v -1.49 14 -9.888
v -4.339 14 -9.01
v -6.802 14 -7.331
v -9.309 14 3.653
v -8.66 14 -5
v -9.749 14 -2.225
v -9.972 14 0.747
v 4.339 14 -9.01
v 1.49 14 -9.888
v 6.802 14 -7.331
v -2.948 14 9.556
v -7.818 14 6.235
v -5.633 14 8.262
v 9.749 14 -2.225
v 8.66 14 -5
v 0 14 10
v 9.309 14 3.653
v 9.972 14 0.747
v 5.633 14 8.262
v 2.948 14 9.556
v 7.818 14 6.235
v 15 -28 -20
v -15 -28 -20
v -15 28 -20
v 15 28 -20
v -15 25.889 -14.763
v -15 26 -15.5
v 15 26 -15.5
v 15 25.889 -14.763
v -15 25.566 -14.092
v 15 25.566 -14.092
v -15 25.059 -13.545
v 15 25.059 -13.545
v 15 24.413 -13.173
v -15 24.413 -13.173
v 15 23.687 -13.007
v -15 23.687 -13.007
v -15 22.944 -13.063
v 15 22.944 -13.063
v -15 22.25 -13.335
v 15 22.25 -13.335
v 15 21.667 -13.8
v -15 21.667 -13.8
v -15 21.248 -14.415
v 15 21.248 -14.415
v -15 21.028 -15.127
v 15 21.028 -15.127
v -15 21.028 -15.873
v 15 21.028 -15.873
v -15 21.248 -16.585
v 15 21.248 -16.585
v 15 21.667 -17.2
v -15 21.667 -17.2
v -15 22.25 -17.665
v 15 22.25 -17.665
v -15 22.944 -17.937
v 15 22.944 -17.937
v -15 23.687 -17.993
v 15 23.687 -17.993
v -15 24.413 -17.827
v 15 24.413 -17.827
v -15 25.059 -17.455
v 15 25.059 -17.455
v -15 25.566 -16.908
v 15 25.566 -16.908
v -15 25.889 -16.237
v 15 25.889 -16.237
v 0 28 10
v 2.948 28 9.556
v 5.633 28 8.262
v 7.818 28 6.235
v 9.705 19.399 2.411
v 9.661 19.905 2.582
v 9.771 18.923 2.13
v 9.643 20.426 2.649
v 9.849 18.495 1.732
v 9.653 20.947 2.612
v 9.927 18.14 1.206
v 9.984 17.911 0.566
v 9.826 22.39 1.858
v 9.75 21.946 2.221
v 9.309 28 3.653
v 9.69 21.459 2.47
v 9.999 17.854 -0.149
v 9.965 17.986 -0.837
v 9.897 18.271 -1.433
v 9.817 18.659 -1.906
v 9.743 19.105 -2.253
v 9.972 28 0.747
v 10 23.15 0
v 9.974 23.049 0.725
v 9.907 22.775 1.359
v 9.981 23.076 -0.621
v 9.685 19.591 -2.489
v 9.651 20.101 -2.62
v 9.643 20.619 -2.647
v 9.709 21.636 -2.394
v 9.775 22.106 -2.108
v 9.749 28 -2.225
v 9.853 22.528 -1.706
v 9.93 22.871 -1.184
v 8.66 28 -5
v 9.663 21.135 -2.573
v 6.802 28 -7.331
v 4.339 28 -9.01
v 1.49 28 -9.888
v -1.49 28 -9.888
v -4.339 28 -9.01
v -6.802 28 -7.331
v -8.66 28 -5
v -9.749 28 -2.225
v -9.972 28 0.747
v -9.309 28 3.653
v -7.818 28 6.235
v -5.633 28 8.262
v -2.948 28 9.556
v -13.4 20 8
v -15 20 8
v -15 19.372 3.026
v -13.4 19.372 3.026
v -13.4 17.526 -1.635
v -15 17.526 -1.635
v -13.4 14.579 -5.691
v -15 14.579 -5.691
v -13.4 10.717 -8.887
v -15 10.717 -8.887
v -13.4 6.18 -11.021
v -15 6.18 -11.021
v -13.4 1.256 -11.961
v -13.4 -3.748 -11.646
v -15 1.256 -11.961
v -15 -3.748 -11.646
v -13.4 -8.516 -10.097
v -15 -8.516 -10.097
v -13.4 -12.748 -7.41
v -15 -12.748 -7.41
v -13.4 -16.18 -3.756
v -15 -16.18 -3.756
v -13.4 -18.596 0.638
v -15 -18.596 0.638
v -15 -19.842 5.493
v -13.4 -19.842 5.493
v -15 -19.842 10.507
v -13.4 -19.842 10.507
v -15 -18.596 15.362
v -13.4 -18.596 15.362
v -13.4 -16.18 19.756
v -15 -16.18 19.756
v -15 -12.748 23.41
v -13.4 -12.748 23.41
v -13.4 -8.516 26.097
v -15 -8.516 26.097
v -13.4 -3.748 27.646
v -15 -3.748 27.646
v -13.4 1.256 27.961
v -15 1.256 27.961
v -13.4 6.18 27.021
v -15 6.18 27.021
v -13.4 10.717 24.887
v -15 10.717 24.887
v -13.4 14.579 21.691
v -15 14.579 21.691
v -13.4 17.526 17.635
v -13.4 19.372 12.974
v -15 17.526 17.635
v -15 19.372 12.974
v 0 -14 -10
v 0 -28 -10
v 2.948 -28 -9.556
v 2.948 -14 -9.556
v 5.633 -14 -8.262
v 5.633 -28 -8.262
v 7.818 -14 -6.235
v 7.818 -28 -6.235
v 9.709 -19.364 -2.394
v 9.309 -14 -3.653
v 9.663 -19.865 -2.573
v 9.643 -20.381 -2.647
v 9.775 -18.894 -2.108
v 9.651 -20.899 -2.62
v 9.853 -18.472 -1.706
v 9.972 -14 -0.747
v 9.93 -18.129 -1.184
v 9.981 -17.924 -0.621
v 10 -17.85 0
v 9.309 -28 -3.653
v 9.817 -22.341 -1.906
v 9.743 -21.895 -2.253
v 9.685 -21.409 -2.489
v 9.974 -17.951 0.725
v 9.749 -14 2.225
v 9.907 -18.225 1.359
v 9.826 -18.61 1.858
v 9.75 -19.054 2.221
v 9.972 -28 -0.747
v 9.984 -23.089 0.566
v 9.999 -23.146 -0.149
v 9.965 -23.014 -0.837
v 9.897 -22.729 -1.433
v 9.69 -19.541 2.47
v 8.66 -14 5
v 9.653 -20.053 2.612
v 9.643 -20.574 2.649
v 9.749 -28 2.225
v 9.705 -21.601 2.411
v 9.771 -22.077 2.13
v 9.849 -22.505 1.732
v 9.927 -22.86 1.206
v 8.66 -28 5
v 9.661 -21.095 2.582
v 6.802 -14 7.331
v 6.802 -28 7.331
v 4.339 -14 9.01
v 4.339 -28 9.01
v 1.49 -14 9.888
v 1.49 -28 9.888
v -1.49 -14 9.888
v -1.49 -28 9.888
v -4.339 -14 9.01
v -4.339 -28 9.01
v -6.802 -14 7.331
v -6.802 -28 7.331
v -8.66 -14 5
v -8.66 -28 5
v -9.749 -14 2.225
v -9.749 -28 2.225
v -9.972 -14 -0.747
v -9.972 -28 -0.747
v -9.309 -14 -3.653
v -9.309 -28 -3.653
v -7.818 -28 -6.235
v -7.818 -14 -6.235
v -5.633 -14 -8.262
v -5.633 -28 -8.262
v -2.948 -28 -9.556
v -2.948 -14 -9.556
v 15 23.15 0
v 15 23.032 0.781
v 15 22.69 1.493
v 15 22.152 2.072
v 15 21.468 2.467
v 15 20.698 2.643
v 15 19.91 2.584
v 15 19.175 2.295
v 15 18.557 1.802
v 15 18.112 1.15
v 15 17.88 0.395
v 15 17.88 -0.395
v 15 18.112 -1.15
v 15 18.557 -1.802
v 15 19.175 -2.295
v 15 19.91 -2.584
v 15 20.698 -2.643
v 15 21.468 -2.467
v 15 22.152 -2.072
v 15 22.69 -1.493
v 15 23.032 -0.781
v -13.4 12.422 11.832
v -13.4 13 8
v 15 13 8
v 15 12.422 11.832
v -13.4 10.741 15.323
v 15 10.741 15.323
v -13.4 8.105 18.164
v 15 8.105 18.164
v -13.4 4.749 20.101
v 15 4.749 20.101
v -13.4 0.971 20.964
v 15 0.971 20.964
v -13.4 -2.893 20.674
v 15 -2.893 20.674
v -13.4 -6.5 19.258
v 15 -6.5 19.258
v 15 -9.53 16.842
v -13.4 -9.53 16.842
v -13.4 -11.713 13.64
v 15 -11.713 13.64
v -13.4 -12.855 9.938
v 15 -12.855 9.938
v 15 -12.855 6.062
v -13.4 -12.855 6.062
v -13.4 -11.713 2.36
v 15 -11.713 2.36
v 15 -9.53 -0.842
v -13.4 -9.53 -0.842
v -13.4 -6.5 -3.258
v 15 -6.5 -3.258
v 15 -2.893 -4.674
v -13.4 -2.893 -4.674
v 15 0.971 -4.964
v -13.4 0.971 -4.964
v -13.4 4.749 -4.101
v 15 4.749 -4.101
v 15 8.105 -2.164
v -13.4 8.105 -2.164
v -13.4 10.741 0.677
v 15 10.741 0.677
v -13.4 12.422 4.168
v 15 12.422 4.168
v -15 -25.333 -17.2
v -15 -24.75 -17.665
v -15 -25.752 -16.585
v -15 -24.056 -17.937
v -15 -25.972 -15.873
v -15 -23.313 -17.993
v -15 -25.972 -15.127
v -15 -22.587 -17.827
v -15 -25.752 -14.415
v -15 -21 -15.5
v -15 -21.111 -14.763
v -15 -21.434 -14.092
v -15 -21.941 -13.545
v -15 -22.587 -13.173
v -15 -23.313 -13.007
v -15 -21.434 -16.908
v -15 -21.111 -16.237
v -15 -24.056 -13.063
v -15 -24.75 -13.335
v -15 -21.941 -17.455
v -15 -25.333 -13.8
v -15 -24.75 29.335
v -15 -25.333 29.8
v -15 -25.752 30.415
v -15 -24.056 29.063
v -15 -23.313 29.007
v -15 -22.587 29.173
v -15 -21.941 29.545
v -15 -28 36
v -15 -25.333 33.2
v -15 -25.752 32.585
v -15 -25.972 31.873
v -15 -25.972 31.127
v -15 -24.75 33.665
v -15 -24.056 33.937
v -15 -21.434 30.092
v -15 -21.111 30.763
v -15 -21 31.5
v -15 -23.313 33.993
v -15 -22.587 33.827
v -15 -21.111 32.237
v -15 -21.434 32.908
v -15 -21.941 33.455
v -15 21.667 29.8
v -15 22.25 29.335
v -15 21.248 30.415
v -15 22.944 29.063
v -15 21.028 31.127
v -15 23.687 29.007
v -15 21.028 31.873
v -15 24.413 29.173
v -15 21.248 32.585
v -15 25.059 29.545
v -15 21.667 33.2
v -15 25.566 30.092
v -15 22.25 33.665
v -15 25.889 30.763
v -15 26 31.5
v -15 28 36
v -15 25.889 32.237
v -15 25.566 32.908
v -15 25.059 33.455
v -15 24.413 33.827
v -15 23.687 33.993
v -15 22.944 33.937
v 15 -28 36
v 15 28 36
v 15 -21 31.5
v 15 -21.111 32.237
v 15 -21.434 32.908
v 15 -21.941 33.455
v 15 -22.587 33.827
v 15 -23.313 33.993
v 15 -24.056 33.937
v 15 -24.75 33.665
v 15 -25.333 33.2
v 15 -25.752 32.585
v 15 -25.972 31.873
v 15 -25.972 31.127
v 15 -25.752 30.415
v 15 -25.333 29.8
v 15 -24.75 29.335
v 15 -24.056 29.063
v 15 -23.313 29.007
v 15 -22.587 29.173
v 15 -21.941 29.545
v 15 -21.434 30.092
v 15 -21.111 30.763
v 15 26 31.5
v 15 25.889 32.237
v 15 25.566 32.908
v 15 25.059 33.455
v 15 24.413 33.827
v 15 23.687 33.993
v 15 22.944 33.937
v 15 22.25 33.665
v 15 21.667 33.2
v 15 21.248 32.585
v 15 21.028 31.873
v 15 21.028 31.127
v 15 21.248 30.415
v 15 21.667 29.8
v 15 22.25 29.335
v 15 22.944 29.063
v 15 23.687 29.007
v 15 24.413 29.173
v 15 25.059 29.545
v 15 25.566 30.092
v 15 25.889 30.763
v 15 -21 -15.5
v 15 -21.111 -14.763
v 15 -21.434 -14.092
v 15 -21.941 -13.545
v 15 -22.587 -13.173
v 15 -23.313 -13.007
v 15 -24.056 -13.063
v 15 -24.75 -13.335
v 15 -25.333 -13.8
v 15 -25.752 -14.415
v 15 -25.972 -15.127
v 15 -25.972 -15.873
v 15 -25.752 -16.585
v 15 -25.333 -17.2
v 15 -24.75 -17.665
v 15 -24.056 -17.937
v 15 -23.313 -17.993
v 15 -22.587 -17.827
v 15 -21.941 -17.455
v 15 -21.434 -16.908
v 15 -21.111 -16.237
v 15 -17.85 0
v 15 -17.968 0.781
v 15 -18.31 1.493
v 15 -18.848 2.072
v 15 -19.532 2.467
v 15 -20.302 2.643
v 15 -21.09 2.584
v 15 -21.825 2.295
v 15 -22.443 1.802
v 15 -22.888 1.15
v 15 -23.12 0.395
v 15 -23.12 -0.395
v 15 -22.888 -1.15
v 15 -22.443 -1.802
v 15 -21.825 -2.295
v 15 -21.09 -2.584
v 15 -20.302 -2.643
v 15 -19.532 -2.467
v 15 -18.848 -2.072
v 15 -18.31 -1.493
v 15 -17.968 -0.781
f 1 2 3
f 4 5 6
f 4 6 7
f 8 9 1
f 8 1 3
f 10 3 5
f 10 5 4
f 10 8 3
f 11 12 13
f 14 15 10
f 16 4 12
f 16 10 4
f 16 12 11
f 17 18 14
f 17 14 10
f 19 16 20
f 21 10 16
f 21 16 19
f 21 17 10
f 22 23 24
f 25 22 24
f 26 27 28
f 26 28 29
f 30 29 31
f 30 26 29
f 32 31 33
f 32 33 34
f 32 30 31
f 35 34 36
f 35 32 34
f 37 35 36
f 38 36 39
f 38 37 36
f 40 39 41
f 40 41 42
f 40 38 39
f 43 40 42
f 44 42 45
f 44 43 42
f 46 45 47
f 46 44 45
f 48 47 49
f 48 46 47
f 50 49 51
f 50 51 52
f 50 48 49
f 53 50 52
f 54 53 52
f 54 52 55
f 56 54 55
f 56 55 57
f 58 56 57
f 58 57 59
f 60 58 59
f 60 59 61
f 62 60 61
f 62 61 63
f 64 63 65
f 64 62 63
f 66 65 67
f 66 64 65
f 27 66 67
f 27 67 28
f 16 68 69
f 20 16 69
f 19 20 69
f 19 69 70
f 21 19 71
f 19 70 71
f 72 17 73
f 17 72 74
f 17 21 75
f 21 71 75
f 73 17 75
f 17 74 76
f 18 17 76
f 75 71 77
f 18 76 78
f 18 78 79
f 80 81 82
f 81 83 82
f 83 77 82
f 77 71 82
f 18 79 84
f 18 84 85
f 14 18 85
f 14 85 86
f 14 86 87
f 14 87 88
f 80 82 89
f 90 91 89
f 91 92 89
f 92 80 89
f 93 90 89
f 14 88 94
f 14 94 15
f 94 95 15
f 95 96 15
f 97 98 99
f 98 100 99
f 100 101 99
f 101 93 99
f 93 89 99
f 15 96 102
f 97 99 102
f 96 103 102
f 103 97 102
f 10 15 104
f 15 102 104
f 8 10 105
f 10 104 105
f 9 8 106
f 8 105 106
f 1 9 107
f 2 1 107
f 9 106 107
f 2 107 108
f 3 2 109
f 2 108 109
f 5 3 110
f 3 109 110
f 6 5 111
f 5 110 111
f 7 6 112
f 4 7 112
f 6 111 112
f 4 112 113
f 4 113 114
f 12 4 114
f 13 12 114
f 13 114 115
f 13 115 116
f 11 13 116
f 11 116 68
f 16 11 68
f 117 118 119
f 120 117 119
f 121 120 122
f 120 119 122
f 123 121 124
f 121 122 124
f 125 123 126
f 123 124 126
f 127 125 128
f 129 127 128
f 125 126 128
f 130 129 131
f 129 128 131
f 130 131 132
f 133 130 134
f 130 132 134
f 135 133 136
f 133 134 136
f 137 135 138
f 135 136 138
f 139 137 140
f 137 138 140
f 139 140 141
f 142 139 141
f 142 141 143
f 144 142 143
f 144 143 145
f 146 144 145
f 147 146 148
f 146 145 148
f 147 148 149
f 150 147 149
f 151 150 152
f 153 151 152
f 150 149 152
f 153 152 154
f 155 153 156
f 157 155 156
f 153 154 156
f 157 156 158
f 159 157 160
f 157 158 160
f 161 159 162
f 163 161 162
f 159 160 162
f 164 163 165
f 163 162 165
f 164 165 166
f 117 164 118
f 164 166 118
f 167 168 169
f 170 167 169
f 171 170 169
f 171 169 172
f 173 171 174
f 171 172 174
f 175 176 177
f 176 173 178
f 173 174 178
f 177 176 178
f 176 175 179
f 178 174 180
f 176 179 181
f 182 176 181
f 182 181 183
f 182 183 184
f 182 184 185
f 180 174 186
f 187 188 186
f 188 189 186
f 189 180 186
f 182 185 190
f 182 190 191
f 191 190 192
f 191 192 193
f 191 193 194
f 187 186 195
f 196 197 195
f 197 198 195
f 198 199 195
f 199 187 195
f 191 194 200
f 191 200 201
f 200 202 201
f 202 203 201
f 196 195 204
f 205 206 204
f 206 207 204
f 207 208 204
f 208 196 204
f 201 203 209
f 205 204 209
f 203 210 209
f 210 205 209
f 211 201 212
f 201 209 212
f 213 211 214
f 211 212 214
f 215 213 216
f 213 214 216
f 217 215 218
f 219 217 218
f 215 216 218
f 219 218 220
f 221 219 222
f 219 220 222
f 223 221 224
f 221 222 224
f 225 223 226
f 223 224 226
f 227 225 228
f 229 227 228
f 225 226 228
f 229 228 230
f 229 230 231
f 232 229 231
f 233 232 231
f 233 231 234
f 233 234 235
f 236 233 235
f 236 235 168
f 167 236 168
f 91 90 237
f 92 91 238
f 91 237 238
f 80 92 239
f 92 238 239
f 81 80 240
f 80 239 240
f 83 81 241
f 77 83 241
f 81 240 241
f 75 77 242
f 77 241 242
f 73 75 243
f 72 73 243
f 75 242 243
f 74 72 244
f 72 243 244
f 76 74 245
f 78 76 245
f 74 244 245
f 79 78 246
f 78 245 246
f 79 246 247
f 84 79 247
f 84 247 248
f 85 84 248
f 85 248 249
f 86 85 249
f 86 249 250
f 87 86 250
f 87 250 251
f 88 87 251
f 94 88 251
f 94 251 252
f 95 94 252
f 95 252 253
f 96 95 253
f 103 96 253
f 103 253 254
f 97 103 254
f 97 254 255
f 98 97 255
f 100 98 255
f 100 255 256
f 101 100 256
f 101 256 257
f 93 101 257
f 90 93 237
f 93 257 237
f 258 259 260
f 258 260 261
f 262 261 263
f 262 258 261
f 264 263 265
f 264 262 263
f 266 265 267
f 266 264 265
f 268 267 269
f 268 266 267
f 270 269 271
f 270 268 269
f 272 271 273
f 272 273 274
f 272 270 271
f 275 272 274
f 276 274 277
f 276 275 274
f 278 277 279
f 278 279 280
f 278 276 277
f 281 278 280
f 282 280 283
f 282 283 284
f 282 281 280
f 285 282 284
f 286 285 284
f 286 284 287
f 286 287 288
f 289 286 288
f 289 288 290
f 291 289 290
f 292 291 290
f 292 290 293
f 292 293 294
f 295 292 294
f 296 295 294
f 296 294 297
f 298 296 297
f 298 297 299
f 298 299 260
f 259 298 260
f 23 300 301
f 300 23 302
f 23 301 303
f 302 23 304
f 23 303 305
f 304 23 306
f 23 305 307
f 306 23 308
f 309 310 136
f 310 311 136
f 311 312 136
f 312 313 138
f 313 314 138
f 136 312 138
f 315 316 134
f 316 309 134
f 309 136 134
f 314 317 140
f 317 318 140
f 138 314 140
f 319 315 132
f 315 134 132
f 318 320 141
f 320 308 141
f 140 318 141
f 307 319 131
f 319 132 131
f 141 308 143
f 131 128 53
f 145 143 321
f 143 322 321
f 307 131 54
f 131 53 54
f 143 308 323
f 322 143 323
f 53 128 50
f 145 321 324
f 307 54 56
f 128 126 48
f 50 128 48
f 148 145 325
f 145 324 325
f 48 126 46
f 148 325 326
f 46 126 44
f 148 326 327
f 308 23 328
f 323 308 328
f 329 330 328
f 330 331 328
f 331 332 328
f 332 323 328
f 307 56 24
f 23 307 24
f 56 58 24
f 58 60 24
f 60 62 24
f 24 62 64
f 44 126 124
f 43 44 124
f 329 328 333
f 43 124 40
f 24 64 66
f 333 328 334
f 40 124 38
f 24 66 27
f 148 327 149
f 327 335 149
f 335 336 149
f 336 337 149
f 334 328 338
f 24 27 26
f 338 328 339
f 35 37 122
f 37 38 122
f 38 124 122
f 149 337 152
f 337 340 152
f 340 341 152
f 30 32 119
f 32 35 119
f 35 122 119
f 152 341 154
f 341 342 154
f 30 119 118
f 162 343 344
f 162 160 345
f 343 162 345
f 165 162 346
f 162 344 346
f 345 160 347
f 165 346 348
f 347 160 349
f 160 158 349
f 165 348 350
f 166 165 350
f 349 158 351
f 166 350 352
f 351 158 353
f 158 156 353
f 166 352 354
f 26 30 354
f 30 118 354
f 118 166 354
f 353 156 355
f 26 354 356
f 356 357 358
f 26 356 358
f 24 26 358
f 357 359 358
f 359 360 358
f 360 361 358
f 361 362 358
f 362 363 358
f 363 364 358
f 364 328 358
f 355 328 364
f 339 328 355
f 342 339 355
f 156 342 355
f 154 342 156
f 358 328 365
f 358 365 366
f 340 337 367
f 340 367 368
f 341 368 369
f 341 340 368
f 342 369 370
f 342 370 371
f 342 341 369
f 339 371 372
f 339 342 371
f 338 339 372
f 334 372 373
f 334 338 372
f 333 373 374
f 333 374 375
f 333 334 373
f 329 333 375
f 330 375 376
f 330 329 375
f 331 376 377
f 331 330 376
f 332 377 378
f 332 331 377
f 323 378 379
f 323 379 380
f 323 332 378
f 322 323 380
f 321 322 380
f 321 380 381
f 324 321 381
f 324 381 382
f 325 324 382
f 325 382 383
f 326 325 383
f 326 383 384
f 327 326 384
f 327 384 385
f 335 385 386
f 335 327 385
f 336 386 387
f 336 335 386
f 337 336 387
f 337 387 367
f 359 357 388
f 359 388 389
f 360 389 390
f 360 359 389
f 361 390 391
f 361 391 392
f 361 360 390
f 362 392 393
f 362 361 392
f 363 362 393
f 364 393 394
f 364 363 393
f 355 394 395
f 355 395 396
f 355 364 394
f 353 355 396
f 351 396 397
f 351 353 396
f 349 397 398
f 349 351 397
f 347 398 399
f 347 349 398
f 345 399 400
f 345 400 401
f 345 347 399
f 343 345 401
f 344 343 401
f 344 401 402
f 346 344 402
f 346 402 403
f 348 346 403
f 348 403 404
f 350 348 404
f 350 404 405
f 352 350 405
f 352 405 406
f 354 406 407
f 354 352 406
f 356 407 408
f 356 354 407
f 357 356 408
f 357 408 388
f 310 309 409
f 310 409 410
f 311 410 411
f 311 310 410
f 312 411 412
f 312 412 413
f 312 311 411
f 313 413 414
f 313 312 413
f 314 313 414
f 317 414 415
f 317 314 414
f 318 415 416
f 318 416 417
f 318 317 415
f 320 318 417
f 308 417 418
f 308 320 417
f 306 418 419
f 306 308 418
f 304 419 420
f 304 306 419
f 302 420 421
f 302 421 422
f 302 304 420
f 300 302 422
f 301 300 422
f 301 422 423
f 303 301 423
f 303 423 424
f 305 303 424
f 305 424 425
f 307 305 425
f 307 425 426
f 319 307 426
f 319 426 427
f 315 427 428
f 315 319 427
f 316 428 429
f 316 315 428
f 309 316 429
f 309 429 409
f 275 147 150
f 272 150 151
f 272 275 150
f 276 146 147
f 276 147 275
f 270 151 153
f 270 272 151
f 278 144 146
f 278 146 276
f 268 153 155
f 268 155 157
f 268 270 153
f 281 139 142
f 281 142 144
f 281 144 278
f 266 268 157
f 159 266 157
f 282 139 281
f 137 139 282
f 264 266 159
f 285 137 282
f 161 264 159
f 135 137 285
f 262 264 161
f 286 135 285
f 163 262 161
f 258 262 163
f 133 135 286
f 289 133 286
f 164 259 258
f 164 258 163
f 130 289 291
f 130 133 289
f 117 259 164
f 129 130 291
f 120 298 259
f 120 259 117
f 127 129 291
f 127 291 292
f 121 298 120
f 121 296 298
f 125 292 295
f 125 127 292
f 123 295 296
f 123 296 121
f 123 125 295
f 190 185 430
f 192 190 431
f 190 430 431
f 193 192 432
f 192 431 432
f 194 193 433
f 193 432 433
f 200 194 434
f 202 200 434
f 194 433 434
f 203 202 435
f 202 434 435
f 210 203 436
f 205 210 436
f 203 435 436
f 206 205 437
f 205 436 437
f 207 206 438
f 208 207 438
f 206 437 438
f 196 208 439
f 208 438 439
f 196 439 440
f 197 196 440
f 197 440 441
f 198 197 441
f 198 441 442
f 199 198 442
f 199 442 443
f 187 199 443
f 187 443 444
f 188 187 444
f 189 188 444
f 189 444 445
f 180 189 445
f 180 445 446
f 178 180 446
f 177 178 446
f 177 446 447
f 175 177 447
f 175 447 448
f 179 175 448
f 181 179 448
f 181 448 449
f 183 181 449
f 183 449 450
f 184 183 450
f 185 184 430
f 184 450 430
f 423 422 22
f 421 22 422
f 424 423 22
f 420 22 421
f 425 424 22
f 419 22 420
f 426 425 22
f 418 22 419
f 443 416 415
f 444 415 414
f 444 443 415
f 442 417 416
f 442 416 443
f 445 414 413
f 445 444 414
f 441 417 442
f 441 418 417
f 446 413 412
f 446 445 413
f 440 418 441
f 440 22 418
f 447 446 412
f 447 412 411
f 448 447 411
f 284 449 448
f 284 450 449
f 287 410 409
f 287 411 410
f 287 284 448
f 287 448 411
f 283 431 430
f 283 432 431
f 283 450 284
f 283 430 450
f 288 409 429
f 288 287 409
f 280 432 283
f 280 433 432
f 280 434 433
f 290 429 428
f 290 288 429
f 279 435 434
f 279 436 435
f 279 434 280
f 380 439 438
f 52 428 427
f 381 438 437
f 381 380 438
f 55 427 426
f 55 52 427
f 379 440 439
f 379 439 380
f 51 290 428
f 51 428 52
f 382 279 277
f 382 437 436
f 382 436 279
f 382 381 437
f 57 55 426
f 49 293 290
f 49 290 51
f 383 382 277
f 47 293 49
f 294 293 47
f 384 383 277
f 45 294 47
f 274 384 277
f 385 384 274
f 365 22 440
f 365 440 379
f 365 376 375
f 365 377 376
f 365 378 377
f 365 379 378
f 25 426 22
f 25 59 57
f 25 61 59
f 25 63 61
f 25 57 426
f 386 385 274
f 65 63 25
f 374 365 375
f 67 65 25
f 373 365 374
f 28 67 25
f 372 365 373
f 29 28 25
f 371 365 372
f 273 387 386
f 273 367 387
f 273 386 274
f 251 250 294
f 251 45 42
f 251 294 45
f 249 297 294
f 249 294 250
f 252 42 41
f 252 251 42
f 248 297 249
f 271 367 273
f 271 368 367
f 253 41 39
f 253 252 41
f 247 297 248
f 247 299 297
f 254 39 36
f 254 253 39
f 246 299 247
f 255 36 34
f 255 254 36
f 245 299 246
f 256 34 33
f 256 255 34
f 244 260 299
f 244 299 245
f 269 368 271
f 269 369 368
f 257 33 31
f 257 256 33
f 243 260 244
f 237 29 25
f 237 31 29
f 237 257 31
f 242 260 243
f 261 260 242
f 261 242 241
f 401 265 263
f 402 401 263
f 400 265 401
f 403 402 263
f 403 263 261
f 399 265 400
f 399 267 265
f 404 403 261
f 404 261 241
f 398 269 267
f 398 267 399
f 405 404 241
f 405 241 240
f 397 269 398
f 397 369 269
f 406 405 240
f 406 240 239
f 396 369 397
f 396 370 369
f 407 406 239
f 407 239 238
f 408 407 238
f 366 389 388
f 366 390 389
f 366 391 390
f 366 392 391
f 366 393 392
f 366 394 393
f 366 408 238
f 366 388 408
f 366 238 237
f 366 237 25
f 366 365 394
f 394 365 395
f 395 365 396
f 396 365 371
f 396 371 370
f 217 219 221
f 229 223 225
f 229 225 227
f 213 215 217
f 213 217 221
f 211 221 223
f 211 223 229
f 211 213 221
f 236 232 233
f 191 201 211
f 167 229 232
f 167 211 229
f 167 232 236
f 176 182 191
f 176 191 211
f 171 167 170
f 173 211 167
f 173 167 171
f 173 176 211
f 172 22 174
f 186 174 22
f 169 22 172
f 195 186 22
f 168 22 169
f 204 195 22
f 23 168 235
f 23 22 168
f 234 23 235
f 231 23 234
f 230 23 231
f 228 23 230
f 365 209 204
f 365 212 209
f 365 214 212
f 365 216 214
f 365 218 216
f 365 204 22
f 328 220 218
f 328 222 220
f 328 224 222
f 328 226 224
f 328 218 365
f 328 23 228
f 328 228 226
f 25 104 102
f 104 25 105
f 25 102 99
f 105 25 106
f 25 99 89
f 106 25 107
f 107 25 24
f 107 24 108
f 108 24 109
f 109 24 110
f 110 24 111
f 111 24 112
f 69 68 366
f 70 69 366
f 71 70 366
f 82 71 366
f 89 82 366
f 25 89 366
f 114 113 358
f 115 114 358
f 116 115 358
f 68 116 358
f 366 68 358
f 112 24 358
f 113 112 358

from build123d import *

# Parameters (mm, degrees)
SKETCH067_W     = 56
SKETCH067_H     = 56
SKETCH067_R     = 2.5
SKETCH067_R_2   = 13
PAD053_DEPTH    = 30
SKETCH068_R     = 10
POCKET007_DEPTH = 14
SKETCH069_R     = 2.65
POCKET008_DEPTH = 7
SKETCH070_R     = 10
POCKET009_DEPTH = 14
SKETCH071_R     = 20
POCKET010_DEPTH = 1.6


with BuildPart() as part:
    # Sketch067 → Pad053 (new body)
    with BuildSketch(Plane.YZ):
        Rectangle(SKETCH067_W, SKETCH067_H)
        with Locations((-23.5, 23.5)):
            Circle(SKETCH067_R, mode=Mode.SUBTRACT)
        with Locations((23.5, 23.5)):
            Circle(SKETCH067_R, mode=Mode.SUBTRACT)
        with Locations((23.5, -23.5)):
            Circle(SKETCH067_R, mode=Mode.SUBTRACT)
        with Locations((-23.5, -23.5)):
            Circle(SKETCH067_R, mode=Mode.SUBTRACT)
        Circle(SKETCH067_R_2, mode=Mode.SUBTRACT)
    extrude(amount=PAD053_DEPTH)

    # Sketch068 (on Face4 of Pad053) → Pocket007 (cut)
    with BuildSketch(Plane(origin=(0, -28, 0), x_dir=(0, 0, -1), z_dir=(0, -1, 0))):
        with Locations((8, 15)):
            Circle(SKETCH068_R)
    extrude(amount=-POCKET007_DEPTH, mode=Mode.SUBTRACT)

    # Sketch069 (on Face5 of Pocket007) → Pocket008 (cut)
    with BuildSketch(Plane.YZ.offset(30)):
        with Locations((-20.5, -8)):
            Circle(SKETCH069_R)
        with Locations((20.5, -8)):
            Circle(SKETCH069_R)
    extrude(amount=-POCKET008_DEPTH, mode=Mode.SUBTRACT)

    # Sketch070 (on Face3 of Pocket008) → Pocket009 (cut)
    with BuildSketch(Plane.ZX.offset(28)):
        with Locations((-8, 15)):
            Circle(SKETCH070_R)
    extrude(amount=-POCKET009_DEPTH, mode=Mode.SUBTRACT)

    # Sketch071 (on Face4 of Pocket009) → Pocket010 (cut)
    with BuildSketch(Plane(origin=(0, 0, 0), x_dir=(0, 1, 0), z_dir=(-1, 0, 0))):
        Circle(SKETCH071_R)
    extrude(amount=-POCKET010_DEPTH, mode=Mode.SUBTRACT)


with BuildPart() as part_1:
    # Body040 placement: moved
    add(part.part.moved(Location((-15, 0, 8))))


solid = part_1.part
